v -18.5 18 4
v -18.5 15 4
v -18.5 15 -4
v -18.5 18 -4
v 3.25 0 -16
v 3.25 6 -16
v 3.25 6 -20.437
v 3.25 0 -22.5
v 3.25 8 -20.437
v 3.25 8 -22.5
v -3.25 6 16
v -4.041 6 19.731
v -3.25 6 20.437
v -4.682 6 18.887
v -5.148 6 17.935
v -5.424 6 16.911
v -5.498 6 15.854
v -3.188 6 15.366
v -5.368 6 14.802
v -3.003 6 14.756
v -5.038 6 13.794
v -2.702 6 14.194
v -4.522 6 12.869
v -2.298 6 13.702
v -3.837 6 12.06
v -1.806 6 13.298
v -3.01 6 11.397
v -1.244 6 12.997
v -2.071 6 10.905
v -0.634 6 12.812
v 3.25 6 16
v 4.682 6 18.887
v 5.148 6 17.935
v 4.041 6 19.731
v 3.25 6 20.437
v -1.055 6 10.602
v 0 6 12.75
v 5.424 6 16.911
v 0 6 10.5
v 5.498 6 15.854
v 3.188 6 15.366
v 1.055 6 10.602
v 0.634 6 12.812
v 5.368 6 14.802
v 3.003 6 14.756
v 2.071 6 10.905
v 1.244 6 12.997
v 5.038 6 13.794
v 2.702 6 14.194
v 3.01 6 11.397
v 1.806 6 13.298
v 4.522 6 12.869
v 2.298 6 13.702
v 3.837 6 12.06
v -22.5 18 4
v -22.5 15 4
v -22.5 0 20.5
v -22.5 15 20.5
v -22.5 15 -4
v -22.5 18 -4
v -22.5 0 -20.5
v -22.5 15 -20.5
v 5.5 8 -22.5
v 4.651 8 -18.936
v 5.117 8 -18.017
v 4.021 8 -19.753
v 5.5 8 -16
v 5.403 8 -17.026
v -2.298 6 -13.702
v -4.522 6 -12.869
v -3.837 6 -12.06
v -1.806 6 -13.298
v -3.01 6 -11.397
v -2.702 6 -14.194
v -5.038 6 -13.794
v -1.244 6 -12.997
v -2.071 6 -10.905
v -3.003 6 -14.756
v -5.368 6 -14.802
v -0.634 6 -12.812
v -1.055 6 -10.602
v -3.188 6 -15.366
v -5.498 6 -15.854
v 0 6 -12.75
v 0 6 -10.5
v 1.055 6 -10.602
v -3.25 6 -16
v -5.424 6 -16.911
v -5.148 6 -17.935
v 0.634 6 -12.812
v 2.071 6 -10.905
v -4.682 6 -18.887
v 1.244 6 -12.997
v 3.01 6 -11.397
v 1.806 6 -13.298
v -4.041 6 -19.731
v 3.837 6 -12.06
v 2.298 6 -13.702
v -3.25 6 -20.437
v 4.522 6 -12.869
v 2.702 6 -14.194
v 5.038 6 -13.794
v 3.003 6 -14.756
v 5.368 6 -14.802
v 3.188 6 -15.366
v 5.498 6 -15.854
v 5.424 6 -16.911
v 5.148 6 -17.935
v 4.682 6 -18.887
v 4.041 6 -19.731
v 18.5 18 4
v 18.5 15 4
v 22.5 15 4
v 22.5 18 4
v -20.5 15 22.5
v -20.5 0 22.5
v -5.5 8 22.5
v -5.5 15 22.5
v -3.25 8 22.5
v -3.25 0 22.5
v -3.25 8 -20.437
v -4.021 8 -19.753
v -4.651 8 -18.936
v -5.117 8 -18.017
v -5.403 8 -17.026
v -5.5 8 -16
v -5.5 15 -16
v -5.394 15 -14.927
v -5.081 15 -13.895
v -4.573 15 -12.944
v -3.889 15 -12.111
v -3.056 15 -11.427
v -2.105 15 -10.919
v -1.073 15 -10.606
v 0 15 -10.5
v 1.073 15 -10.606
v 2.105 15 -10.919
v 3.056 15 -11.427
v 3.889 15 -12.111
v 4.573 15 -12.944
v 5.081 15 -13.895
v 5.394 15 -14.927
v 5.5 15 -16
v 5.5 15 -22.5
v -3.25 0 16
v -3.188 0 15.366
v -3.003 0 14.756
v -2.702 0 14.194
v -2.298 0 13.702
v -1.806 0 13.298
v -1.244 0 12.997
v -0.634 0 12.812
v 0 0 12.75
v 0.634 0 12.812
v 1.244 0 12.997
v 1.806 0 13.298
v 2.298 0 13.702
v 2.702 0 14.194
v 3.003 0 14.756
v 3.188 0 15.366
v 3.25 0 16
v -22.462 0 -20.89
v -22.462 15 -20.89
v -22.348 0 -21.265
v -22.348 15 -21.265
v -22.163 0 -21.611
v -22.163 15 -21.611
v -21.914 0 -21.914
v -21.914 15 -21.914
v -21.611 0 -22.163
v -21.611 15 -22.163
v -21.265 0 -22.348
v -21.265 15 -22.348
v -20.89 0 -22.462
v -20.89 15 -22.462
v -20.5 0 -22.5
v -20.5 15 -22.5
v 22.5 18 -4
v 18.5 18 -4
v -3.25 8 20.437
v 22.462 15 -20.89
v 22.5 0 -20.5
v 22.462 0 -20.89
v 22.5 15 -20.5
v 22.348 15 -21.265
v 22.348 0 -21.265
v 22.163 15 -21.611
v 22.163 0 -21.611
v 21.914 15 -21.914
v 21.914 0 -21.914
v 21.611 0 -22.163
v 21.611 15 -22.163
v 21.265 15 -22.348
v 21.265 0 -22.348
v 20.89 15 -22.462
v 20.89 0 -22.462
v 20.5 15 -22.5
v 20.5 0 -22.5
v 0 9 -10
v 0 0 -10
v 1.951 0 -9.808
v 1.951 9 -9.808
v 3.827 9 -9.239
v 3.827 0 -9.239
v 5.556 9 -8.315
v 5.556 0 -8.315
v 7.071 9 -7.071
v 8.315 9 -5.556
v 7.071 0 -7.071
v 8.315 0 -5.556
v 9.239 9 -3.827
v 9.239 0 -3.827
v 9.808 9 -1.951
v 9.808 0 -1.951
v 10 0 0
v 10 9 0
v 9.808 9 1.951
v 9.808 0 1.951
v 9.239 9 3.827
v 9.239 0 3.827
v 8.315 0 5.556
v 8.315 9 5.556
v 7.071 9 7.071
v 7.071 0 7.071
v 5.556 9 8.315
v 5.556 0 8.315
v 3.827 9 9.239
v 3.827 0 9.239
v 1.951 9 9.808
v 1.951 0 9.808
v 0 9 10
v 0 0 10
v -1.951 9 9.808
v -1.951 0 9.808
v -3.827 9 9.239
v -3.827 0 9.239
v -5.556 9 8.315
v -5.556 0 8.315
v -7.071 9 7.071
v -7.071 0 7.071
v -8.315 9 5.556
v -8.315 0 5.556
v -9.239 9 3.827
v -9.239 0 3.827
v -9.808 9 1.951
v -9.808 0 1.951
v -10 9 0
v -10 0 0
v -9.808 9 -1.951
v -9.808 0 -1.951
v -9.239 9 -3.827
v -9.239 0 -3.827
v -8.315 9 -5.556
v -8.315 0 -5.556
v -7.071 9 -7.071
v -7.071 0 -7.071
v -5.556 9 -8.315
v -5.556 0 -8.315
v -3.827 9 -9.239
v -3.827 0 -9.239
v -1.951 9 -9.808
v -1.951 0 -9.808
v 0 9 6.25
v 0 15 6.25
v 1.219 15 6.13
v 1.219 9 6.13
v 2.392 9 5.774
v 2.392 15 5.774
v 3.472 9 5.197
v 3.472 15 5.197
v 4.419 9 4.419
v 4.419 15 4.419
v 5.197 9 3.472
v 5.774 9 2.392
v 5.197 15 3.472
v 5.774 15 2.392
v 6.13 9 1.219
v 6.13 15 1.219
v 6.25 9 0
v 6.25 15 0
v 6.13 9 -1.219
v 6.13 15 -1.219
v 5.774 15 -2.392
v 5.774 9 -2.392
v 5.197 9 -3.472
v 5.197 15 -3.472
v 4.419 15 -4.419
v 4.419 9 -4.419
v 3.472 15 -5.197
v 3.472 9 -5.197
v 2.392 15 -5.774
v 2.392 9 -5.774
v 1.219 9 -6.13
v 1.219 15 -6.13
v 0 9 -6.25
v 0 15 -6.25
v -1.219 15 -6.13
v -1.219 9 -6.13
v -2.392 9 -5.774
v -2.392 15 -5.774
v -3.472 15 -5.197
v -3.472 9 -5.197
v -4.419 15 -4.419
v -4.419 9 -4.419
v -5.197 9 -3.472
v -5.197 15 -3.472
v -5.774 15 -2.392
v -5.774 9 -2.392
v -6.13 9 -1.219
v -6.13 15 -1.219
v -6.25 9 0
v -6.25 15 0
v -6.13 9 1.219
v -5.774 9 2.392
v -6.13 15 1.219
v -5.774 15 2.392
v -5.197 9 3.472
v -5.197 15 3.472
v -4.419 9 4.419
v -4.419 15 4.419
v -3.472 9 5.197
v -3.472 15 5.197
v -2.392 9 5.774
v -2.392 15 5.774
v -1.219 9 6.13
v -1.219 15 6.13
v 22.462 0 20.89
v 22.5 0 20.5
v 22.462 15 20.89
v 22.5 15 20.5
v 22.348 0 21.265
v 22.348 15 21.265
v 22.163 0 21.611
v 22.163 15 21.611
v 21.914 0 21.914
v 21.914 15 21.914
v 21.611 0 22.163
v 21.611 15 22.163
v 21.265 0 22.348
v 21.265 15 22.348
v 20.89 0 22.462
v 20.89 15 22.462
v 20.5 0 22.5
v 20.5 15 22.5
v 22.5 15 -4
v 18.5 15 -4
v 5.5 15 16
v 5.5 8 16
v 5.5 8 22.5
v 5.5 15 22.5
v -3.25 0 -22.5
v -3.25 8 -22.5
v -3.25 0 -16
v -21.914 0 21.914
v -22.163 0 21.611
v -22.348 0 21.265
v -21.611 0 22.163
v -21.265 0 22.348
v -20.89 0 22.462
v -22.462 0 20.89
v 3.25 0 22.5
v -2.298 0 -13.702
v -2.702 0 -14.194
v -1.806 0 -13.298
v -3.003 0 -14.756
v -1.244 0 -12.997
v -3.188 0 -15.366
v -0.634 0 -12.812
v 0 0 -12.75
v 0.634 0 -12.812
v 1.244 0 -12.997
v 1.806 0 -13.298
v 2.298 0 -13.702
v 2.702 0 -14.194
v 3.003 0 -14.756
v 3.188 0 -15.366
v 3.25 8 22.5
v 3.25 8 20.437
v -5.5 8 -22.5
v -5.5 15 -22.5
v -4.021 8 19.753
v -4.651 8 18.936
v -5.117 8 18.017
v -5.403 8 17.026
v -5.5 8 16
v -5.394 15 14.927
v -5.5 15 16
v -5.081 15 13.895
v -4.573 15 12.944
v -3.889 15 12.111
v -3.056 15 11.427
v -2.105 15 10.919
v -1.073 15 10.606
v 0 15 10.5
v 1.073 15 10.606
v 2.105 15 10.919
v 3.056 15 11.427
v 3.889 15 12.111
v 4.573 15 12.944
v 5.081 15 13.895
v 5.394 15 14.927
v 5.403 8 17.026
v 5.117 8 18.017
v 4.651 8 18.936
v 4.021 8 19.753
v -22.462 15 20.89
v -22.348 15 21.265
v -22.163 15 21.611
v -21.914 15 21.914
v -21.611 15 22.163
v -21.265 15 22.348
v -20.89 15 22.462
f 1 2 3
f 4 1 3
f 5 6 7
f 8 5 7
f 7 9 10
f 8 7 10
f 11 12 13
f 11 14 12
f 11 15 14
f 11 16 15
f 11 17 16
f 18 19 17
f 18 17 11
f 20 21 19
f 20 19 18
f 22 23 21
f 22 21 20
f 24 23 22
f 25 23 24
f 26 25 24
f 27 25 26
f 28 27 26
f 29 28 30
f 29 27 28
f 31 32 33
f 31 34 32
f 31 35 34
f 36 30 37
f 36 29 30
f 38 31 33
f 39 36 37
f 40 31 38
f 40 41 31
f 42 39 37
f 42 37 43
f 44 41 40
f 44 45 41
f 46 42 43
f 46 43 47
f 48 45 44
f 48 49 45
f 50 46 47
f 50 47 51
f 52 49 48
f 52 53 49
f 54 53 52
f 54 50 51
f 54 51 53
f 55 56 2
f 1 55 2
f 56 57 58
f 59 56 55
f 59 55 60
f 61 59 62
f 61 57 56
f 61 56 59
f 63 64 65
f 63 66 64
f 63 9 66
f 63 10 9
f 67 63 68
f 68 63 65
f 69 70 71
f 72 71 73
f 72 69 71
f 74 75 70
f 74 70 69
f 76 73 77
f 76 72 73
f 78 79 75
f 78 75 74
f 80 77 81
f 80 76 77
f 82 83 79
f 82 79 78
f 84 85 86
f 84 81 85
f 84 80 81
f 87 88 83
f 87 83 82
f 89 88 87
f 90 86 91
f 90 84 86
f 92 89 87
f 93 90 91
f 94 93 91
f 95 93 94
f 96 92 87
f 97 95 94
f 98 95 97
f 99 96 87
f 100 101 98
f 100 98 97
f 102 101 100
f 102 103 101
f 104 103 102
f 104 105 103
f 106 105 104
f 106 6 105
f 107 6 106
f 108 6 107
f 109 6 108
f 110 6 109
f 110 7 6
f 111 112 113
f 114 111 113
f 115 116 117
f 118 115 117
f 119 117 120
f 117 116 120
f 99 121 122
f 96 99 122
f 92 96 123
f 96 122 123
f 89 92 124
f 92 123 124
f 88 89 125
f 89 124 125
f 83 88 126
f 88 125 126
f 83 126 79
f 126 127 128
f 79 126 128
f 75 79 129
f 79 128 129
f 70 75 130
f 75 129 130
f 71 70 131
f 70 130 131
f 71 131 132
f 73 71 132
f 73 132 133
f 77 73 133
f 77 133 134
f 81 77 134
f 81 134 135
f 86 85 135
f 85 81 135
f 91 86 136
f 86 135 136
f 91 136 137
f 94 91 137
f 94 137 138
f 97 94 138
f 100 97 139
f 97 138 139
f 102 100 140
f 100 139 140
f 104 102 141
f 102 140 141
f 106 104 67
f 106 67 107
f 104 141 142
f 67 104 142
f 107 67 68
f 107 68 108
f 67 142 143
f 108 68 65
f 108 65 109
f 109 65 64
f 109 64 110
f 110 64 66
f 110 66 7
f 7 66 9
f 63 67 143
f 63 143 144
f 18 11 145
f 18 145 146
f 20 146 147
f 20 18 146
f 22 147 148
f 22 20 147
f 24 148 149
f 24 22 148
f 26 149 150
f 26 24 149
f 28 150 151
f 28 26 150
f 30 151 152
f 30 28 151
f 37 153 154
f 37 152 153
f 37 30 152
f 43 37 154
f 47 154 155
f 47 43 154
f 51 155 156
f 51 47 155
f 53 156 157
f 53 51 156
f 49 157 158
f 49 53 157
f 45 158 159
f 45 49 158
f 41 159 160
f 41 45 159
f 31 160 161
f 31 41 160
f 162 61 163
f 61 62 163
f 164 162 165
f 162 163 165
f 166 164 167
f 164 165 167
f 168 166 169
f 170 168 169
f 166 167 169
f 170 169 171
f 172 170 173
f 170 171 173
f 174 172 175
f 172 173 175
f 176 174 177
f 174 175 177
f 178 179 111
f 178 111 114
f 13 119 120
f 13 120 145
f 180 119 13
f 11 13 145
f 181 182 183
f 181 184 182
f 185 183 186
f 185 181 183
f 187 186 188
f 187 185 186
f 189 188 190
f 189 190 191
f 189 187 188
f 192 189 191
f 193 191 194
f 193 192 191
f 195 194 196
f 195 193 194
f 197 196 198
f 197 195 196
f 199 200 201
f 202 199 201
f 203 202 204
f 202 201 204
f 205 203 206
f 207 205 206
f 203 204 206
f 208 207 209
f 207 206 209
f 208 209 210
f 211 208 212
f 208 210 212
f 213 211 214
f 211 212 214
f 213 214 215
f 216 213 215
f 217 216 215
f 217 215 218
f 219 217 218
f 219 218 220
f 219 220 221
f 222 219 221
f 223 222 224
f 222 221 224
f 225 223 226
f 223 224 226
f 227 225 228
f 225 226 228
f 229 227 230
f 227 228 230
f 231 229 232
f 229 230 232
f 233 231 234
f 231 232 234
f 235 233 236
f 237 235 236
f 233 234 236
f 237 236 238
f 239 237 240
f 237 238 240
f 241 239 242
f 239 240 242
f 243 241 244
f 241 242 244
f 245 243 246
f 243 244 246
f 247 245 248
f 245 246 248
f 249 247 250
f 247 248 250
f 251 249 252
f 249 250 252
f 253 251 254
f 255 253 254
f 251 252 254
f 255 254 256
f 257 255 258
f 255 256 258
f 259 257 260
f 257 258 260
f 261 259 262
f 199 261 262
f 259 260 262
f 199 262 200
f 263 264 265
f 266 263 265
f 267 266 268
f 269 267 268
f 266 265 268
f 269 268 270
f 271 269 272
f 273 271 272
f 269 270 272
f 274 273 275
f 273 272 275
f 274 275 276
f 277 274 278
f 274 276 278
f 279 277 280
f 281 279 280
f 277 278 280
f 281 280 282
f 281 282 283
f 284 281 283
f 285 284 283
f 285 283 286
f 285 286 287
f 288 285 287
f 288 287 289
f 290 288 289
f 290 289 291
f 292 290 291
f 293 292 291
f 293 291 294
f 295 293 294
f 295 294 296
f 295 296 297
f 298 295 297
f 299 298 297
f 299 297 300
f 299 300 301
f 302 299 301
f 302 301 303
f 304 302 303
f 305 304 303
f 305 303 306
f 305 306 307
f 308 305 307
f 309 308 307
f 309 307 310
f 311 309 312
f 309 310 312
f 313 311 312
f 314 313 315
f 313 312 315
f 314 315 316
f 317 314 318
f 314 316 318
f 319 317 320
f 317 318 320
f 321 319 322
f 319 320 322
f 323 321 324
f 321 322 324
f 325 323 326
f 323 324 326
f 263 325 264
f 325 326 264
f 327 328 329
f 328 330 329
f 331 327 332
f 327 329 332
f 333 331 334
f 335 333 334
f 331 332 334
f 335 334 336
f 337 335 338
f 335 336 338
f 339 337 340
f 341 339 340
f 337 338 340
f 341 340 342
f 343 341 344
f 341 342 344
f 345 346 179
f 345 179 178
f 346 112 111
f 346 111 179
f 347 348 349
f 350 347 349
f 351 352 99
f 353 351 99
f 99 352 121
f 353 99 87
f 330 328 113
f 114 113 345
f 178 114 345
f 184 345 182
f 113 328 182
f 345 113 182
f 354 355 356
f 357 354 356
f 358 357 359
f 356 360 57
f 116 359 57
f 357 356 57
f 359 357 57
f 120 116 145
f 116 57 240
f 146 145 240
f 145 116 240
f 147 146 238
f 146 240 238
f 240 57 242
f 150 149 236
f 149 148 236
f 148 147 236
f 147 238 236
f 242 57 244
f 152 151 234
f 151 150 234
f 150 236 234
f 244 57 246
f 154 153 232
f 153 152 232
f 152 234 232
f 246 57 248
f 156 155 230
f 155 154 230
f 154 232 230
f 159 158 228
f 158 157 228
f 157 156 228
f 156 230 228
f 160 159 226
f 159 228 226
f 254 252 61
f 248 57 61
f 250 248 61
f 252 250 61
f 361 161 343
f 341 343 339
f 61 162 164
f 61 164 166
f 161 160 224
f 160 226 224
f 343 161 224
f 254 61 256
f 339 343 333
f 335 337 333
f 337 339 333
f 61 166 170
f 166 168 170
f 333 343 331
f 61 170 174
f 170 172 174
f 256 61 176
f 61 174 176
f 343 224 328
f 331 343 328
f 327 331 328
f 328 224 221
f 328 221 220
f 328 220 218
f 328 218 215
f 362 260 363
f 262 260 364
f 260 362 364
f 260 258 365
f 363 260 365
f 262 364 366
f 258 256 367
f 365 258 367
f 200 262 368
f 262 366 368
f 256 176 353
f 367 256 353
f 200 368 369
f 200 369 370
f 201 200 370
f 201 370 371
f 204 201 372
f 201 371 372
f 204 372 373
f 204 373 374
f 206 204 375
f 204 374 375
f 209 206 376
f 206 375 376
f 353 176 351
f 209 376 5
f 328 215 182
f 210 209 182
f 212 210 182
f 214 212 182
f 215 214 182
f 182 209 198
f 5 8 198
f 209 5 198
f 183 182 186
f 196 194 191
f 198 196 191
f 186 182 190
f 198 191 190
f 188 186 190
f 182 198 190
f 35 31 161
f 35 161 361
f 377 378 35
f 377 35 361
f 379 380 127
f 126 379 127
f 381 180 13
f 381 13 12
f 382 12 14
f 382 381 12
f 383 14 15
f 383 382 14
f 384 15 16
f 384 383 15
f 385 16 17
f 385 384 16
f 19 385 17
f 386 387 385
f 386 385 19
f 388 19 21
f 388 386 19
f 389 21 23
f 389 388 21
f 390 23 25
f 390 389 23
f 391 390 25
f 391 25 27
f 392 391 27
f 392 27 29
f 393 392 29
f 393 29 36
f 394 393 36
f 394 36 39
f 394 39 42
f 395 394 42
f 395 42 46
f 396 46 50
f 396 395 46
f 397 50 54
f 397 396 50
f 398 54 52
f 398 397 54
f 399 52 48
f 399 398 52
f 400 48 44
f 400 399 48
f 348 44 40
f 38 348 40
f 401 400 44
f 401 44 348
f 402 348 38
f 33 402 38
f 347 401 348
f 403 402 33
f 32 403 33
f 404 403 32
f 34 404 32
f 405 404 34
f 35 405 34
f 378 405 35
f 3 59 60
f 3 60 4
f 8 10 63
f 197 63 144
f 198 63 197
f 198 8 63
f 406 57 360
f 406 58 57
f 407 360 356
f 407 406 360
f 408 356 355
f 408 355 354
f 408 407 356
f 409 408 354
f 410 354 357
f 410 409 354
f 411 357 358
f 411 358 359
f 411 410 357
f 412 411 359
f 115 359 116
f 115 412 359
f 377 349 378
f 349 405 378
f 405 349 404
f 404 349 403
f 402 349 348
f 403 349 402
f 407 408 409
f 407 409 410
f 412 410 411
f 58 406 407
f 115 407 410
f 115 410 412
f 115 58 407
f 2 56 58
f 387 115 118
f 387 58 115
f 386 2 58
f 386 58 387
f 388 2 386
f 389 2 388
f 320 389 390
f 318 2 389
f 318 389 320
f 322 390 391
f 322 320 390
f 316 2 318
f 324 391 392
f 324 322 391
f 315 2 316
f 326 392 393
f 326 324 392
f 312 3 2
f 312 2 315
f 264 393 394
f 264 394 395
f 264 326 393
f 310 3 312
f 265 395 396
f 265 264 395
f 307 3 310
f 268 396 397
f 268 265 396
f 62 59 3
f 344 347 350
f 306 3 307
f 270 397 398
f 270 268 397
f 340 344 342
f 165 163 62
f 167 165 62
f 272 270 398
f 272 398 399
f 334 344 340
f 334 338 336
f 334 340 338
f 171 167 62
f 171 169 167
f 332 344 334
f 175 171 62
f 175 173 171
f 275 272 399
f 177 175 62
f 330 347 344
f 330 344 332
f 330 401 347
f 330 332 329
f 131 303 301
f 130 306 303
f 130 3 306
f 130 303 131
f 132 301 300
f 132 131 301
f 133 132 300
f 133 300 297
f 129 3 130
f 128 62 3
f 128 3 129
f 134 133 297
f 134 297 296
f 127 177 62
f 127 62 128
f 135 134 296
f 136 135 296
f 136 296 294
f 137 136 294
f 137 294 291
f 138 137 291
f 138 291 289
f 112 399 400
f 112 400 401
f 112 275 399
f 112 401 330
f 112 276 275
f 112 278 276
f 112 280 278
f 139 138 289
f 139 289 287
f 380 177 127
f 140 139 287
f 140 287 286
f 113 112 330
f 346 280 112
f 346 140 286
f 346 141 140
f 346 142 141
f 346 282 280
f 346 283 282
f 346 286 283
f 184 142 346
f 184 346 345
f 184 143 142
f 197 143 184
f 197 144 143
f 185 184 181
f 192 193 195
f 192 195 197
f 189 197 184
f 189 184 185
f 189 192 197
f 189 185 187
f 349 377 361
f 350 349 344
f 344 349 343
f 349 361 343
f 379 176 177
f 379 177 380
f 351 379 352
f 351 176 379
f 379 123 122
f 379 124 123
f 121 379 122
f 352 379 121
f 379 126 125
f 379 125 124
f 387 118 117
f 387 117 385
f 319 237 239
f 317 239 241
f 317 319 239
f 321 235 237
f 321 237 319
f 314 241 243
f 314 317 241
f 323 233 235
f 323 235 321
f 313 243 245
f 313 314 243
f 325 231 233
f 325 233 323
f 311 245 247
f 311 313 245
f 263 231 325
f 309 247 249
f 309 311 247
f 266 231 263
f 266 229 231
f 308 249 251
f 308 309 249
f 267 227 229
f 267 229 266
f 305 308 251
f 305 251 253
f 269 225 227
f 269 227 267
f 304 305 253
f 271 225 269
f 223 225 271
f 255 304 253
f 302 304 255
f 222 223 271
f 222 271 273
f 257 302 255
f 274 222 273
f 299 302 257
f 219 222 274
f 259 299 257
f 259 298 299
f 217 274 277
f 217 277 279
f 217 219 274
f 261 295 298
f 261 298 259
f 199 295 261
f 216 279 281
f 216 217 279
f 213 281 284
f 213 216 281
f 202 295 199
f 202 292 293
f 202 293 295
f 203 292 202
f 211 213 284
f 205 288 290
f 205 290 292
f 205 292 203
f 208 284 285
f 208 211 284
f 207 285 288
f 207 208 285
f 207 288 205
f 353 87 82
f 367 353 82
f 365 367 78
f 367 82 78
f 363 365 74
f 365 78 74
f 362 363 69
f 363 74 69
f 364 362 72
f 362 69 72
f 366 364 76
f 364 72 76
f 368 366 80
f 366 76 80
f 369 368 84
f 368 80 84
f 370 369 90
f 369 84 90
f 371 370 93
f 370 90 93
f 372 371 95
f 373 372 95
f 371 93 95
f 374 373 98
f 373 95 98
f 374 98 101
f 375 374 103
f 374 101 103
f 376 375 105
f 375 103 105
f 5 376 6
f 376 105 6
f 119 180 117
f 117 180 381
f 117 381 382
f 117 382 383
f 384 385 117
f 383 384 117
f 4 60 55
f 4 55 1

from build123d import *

# Parameters (mm, degrees)
SKETCH_1_W          = 45
SKETCH_1_H          = 45
EXTRUDE_1_DEPTH     = 15
SKETCH_2_W          = 4
SKETCH_2_H          = 8
EXTRUDE_2_DEPTH     = 3
SKETCH_3_R          = 6.25
CUT_EXTRUDE_1_DEPTH = 16
SKETCH_4_R          = 10
CUT_EXTRUDE_2_DEPTH = 9
CUT_EXTRUDE_3_DEPTH = 7
SKETCH_6_R          = 5.5
CUT_EXTRUDE_4_DEPTH = 2
FILLET_1_R          = 2


with BuildPart() as part:
    # Эскиз1 → Бобышка-Вытянуть1 (new body)
    with BuildSketch(Plane(origin=(0, 0, 0), x_dir=(1, 0, 0), z_dir=(0, 1, 0))):
        Rectangle(SKETCH_1_W, SKETCH_1_H)
    extrude(amount=EXTRUDE_1_DEPTH)

    # Эскиз2 → Бобышка-Вытянуть2 (add)
    with BuildSketch(Plane(origin=(0, 15, 0), x_dir=(1, 0, 0), z_dir=(0, 1, 0))):
        with Locations((-20.5, 0)):
            Rectangle(SKETCH_2_W, SKETCH_2_H)
        with Locations((20.5, 0)):
            Rectangle(SKETCH_2_W, SKETCH_2_H)
    extrude(amount=EXTRUDE_2_DEPTH)

    # Эскиз3 → Вырез-Вытянуть1 (cut, through all)
    with BuildSketch(Plane(origin=(0, 15, 0), x_dir=(1, 0, 0), z_dir=(0, 1, 0))):
        with Locations(Location((0, 0, 0), (0, 0, 270))):  # turned: the seam where the file's is
            Circle(SKETCH_3_R)
        with BuildLine():
            Line((-3.25, -22.5), (-3.25, -16))
            ThreePointArc((-3.25, -16), (0, -12.75), (3.25, -16))
            Line((3.25, -16), (3.25, -22.5))
            Line((3.25, -22.5), (-3.25, -22.5))
        make_face()
        with BuildLine():
            Line((3.25, 16), (3.25, 22.5))
            Line((3.25, 22.5), (-3.25, 22.5))
            Line((-3.25, 22.5), (-3.25, 16))
            ThreePointArc((-3.25, 16), (0, 12.75), (3.25, 16))
        make_face()
    extrude(amount=-CUT_EXTRUDE_1_DEPTH, mode=Mode.SUBTRACT)

    # Эскиз4 → Вырез-Вытянуть2 (cut)
    with BuildSketch(Plane.XZ):
        with Locations(Location((0, 0, 0), (0, 0, 270))):  # turned: the seam where the file's is
            Circle(SKETCH_4_R)
    extrude(amount=-CUT_EXTRUDE_2_DEPTH, mode=Mode.SUBTRACT)

    # Эскиз5 → Вырез-Вытянуть3 (cut)
    with BuildSketch(Plane(origin=(0, 15, 0), x_dir=(1, 0, 0), z_dir=(0, 1, 0))):
        with BuildLine():
            Line((-5.5, -22.5), (-5.5, -16))
            ThreePointArc((-5.5, -16), (0, -10.5), (5.5, -16))
            Line((5.5, -16), (5.5, -22.5))
            Line((5.5, -22.5), (-5.5, -22.5))
        make_face()
        with BuildLine():
            Line((5.5, 16), (5.5, 22.5))
            Line((5.5, 22.5), (-5.5, 22.5))
            Line((-5.5, 22.5), (-5.5, 16))
            ThreePointArc((-5.5, 16), (0, 10.5), (5.5, 16))
        make_face()
    extrude(amount=-CUT_EXTRUDE_3_DEPTH, mode=Mode.SUBTRACT)

    # Эскиз6 → Вырез-Вытянуть4 (cut)
    with BuildSketch(Plane(origin=(0, 8, 0), x_dir=(1, 0, 0), z_dir=(0, 1, 0))):
        with Locations((0, -16)):
            Circle(SKETCH_6_R)
        with Locations((0, 16)):
            Circle(SKETCH_6_R)
    extrude(amount=-CUT_EXTRUDE_4_DEPTH, mode=Mode.SUBTRACT)

    # Скругление1
    fillet_1_edges = [part.edges().sort_by_distance(p)[0] for p in [
        (-22.5, 7.5, -22.5),
        (22.5, 7.5, -22.5),
        (22.5, 7.5, 22.5),
        (-22.5, 7.5, 22.5),
    ]]
    fillet(fillet_1_edges, radius=FILLET_1_R)


solid = part.part
